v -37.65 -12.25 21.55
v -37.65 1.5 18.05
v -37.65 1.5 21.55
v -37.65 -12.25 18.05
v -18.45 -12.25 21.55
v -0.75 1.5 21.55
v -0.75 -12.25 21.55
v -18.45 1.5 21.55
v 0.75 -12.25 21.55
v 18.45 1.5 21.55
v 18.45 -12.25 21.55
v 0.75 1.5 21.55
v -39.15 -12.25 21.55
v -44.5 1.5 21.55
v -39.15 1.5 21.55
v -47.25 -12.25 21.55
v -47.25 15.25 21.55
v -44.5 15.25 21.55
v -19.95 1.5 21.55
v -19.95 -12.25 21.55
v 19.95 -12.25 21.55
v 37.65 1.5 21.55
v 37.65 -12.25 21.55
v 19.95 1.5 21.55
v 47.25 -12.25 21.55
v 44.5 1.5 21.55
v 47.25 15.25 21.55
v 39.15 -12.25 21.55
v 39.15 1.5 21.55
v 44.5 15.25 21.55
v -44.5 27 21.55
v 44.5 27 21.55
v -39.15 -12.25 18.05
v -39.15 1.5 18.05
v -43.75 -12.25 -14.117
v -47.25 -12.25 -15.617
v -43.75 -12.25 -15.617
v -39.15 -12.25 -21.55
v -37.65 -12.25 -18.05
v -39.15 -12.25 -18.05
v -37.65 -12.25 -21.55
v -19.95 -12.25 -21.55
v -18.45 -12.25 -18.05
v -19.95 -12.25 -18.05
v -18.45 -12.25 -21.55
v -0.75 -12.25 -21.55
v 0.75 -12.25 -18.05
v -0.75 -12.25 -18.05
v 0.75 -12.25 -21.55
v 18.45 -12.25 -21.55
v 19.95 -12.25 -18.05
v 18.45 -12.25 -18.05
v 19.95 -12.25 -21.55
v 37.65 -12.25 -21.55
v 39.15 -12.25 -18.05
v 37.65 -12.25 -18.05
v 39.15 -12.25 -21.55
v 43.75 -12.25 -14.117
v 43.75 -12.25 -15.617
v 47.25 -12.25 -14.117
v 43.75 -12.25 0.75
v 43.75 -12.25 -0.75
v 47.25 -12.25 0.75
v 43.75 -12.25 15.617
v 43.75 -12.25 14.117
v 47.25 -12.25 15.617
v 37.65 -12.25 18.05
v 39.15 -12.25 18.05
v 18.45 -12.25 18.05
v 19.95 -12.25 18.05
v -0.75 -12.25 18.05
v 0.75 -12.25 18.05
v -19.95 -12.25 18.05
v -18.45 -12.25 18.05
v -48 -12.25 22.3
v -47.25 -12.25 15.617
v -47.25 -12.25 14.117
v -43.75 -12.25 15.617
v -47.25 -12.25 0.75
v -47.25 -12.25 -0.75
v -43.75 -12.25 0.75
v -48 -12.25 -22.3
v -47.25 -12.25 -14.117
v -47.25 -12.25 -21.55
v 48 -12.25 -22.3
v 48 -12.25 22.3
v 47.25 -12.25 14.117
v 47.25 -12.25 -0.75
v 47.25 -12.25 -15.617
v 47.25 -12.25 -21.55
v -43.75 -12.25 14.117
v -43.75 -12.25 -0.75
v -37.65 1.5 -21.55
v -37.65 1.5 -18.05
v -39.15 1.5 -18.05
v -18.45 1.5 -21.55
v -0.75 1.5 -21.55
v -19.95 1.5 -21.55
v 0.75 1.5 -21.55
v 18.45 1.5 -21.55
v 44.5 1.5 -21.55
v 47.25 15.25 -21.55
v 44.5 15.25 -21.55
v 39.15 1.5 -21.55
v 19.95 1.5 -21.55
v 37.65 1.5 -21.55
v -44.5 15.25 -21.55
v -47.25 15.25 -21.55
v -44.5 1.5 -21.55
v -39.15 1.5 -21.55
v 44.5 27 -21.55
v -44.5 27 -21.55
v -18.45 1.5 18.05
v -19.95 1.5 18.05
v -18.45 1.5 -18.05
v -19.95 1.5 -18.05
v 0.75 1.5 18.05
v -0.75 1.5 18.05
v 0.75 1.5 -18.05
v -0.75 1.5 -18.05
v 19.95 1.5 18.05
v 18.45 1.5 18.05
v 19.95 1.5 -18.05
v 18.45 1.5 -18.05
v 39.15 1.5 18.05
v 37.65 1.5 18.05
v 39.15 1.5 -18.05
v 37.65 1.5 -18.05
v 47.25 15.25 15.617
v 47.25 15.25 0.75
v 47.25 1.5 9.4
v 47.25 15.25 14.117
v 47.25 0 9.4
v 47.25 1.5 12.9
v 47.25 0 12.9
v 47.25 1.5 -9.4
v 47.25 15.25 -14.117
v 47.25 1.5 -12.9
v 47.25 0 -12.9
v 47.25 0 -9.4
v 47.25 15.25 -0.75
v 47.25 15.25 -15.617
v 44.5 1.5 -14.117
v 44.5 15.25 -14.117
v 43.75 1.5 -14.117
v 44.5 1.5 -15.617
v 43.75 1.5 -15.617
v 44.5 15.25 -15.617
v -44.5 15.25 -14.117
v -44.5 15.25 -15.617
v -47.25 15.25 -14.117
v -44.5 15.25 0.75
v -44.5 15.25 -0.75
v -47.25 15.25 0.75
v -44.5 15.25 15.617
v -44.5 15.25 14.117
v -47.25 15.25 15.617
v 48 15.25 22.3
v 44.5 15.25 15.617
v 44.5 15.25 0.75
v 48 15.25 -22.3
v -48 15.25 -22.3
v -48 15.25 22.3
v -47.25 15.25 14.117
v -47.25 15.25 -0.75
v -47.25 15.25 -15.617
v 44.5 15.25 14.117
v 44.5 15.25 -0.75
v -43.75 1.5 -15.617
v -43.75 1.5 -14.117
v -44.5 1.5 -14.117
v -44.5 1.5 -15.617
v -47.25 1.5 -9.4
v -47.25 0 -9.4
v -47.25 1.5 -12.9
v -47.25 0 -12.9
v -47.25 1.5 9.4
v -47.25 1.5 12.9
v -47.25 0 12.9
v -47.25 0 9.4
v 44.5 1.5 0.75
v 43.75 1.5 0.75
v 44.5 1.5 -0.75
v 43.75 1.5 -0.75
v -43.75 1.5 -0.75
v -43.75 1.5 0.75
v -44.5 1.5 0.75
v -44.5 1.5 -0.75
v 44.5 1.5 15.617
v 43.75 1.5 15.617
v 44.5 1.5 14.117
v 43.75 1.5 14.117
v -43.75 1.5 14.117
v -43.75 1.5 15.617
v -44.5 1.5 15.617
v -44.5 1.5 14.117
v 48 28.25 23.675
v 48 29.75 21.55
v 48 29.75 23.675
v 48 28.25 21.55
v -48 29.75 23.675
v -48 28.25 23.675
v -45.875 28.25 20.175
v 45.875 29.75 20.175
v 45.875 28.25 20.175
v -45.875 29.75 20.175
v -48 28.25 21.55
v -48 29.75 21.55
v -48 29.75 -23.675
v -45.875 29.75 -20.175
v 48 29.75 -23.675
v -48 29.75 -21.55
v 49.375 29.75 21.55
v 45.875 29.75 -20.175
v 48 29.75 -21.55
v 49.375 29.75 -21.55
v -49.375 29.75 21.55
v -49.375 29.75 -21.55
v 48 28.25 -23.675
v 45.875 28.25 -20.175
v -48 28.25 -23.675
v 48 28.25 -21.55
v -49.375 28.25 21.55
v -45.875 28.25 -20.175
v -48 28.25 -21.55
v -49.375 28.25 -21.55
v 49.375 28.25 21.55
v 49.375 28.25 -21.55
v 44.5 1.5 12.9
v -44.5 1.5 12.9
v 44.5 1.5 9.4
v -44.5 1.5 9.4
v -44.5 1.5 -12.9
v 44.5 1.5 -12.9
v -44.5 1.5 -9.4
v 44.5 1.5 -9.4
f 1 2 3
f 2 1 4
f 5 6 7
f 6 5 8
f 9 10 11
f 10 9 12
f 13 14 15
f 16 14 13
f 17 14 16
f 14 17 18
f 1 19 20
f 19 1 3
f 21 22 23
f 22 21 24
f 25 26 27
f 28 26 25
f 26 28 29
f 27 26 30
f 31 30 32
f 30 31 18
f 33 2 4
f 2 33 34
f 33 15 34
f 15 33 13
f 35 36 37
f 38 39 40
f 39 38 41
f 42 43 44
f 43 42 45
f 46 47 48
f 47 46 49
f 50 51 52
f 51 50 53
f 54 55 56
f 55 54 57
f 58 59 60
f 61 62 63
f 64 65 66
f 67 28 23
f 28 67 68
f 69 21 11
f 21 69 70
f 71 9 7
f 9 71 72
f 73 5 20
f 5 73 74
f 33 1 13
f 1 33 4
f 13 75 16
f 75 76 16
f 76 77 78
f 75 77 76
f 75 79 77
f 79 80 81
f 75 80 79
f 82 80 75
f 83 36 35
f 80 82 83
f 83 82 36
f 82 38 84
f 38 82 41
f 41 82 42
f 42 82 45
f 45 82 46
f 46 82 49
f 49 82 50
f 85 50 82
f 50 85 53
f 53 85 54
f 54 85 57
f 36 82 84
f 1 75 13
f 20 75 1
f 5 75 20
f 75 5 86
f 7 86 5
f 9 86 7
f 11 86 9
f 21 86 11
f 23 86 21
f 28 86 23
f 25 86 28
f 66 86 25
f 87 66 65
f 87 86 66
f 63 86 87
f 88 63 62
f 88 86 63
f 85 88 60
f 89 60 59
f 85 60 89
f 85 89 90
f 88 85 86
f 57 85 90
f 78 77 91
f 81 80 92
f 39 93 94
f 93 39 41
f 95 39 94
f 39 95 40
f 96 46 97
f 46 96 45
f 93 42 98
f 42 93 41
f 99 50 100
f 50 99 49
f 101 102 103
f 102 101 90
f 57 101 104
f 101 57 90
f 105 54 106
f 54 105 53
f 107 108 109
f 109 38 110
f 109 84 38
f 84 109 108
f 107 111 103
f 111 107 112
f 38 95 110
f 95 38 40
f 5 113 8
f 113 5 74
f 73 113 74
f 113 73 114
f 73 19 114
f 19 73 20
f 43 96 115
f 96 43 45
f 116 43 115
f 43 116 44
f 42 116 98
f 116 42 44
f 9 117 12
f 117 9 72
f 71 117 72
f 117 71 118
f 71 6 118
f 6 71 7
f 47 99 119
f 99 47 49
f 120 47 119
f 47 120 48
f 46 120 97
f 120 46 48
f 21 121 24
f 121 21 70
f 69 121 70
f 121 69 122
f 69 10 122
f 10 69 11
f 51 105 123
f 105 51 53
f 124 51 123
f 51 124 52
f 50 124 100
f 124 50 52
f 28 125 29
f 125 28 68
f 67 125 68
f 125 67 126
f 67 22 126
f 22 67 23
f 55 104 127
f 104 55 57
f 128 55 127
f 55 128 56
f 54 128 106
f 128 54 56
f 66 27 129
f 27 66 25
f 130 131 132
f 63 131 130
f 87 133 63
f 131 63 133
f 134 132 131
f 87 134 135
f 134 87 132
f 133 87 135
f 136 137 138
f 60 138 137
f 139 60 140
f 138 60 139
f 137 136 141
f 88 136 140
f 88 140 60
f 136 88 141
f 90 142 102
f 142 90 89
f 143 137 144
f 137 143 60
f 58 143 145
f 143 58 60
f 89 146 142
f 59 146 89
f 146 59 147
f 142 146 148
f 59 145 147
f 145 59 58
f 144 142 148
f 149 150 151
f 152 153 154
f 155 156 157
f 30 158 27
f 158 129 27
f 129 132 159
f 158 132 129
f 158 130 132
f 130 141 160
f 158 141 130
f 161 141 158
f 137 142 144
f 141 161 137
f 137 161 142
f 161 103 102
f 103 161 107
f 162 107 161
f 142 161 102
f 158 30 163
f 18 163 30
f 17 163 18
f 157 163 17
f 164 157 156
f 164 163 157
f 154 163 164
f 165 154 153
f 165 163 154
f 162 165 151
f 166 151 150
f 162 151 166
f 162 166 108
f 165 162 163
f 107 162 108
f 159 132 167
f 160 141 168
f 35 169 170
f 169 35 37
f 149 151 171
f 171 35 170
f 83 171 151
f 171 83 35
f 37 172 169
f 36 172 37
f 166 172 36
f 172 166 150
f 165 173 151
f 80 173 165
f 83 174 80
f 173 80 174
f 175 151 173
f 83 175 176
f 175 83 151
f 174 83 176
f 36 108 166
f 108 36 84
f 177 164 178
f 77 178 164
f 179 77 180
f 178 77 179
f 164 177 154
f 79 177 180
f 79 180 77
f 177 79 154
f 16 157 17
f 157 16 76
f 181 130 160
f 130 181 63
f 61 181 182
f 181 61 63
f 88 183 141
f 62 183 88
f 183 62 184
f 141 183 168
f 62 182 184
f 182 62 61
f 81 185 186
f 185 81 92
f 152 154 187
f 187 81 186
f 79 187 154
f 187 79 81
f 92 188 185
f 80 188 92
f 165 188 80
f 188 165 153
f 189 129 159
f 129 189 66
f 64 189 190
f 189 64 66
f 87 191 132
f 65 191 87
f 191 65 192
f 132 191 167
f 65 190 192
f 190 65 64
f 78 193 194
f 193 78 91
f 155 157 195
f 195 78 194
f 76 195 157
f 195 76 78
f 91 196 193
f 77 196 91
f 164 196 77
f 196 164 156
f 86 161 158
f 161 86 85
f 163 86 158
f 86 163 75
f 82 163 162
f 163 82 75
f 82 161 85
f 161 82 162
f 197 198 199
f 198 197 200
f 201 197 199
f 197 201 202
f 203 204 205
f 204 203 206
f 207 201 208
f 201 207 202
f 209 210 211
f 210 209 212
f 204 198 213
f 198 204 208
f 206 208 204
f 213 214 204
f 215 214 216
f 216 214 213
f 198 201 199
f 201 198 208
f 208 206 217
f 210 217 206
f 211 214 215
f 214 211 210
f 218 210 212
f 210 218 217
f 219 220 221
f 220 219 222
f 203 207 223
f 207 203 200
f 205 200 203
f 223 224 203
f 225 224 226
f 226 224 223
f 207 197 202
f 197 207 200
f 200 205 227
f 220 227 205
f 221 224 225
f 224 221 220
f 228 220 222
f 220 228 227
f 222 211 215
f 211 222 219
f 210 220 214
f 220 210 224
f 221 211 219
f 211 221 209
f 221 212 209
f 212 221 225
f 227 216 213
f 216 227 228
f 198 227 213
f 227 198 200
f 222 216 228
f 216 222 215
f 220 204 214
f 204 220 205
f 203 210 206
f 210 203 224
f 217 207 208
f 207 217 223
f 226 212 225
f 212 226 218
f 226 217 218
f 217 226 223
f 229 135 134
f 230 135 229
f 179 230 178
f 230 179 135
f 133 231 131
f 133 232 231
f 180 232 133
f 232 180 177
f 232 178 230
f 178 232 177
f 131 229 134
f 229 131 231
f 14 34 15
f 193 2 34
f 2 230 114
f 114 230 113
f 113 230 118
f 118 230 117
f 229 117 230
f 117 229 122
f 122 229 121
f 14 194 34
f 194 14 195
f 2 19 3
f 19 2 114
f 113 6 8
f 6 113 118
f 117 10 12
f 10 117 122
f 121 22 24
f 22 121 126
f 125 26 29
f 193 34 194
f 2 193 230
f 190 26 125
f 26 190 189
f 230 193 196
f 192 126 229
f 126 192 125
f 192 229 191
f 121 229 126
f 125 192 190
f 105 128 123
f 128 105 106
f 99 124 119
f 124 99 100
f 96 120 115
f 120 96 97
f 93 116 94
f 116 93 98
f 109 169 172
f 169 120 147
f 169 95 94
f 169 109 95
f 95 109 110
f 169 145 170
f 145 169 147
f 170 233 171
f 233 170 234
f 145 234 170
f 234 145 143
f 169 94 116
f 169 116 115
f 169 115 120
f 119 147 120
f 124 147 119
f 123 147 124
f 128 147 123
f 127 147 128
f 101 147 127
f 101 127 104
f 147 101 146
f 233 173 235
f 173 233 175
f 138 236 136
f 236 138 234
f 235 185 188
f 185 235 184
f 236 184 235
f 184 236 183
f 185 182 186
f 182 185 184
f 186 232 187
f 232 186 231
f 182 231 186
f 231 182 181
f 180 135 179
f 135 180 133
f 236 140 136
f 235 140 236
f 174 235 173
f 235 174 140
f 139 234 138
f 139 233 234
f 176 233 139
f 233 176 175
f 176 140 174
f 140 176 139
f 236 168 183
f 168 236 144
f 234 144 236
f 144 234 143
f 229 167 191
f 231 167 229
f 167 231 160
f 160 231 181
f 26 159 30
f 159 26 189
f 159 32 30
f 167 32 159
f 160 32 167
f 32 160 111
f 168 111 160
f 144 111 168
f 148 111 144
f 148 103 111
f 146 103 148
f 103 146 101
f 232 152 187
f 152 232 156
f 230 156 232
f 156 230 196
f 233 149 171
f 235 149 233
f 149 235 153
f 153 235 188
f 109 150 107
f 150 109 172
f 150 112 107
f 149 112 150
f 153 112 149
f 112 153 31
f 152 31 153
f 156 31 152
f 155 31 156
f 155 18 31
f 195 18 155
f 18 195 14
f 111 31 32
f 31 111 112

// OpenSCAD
// file: ../wattplot_params.scad
// =============================================================================
// wattplot_params.scad -- mirror of wattplot_params.py
// =============================================================================
//
// DO NOT EDIT THESE NUMBERS WITHOUT UPDATING wattplot_params.py AND
// firmware/tests/test_openscad_params.py.
//
// The Python source of truth is wattplot_params.py at the repo root.
// This file is a hand-maintained mirror so the OpenSCAD models can
// render without Python. A CI test (test_openscad_params.py) reads
// both and fails if any number has drifted.
//
// If you change a value here, change it in wattplot_params.py first
// and update the test expectations in test_openscad_params.py. The
// commit message should reference the param name (e.g.
// "scad: bump POSTS.height_in to 78 for v3.1 storm margin").
//
// All dimensions are in inches. OpenSCAD's $fn controls mesh
// resolution -- 64 gives a clean STL that's about 2 MB at this
// model's complexity.

// ---------- LOCATION ----------
location_latitude  = 33.45;     // Phoenix, AZ
location_longitude = -112.07;
location_elevation_m = 337;
location_design_wind_mph = 115.0; // ASCE 7-22, Risk Cat II 700-yr

// ---------- PLANTER LIMITS ----------
max_planter_L_in = 96.0;          // 8 ft stock, no waste on long rails
max_planter_W_in = 60.0;          // 5 ft (8 ft cross-cut, 2 cross-rails per board)

// ---------- BED (planter, ballasted) ----------
bed_outer_L_in       = 96.0;       // 8 ft (capped at max_planter_L_in)
bed_outer_W_in       = 44.6;       // matches panel width
bed_wall_thk_in      = 0.75;       // 1x6 cedar (3/4" actual)
bed_wall_h_in        = 27.5;       // 5 courses of 1x6 (5.5" actual)
                                   //   wind-sized: SF_overturning 2.55 at 35°
bed_soil_fill_in     = 25.5;       // 2" freeboard below the rim
                                   //   ~60 cu ft = 2.2 cu yd = ~4,000 lb
bed_skid_h_in        = 1.5;        // walls rest on 2x4 footers
bed_skid_side_in     = 3.5;        // 4x nominal

// ---------- BED WALL (1x6 cedar skin over 2x4 cleats) ----------
wall_skin_thk_in   = 0.75;
wall_course_h_in   = 5.5;
wall_courses       = 5;            // 5 x 5.5" = 27.5" wall
wall_cleat_thk_in  = 1.5;          // 2x4 actual
wall_cleat_wid_in  = 3.5;          // 2x4 actual
wall_cleats_long   = 5;            // per long wall
wall_cleats_short  = 3;            // per short wall
wall_header_thk_in = 1.5;         // 2x4 on wide face
wall_header_wid_in = 3.5;

// ---------- POSTS (4x4 PT, 72" tall, walk-under canopy) ----------
post_thk_in  = 3.5;               // 4x4 actual
post_height_in = 72.0;            // 6 ft -- walk-under / reach-under
post_count   = 4;
post_rail_thk_in = 1.5;          // 2x6 on post tops
post_rail_wid_in = 5.5;

// ---------- PANEL (LONGi Hi-MO X10 620W default) ----------
panel_L_in        = 97.0;         // 8.08 ft (overhangs bed 0.5"/side)
panel_W_in        = 44.6;         // 3.72 ft
panel_thk_in      = 1.4;
panel_mass_lb     = 65.0;
panel_wattage     = 620;
panel_tilt_deg    = 35.0;         // 0 = flat, 35 = max (wind-limited)

// ---------- CONTROL (tilt cap + PI setpoint) ----------
control_max_tilt_deg  = 35.0;     // STRUCTURAL cap. See ADR-001.
control_target_current_A = 0.5;
control_hard_current_limit_A = 2.5;

// ---------- FRAME (perimeter around the panel) ----------
frame_long_rail_thk_in   = 1.5;    // 2x6 actual
frame_long_rail_wid_in   = 5.5;
frame_long_rail_length_in = 96.0;  // 8 ft stock, no waste

frame_cross_rail_thk_in   = 1.5;   // 2x6 actual
frame_cross_rail_wid_in   = 5.5;
frame_cross_rail_length_in = 42.0; // 2x6x8ft cut to 42"

frame_brace_thk_in   = 1.5;         // 2x4 actual
frame_brace_wid_in   = 3.5;
frame_brace_length_in = 102.0;     // 2x4x10ft cut to 102"

// ---------- HINGES + PANEL CLAMPS ----------
hinge_leaf_in    = 4.0;            // 4"x4" leaf, 1/2" pin
hinge_pin_d_in    = 0.5;
hinge_count      = 4;
hinge_spacing_in = 22.0;           // 22" o.c.
hinge_rod_length_in = 72.0;        // 1/2" x 72" steel rod (HD)

panel_clamp_length_in = 2.0;       // IronRidge mid-clamp, 35mm channel
panel_clamp_height_in = 2.0;
panel_clamp_thk_in   = 0.4;
panel_clamps_per_long_rail  = 2;
panel_clamps_per_cross_rail = 1;

// ---------- ACTUATOR MOUNT ----------
actuator_block_thk_in  = 1.5;      // 2x6 actual
actuator_block_wid_in  = 5.5;
actuator_block_length_in = 6.0;
actuator_stroke_in     = 4.0;       // 12V linear actuator
actuator_width_in      = 2.0;       // body width (for clearance check)
actuator_height_in     = 2.5;

// ---------- DERIVED (don't change) ----------
// Bed is sized so the panel overhangs the rails by 0.5" per side.
// The panel mid-clamps grip the aluminum frame, not the glass.
bed_inner_L_in = bed_outer_L_in - 2 * post_thk_in;
bed_inner_W_in = bed_outer_W_in - 2 * wall_skin_thk_in;
// Wall sits on top of skid; rim = wall + skid.
bed_rim_h_in = bed_wall_h_in + bed_skid_h_in;
// Panel frame offset above the bed rail (clearance for the clamp).
panel_clearance_in = 2.0;         // 2" above the rail top

// Render resolution: $fn controls segment count for curves.
// 64 gives a clean STL ~2 MB. Lower for fast preview, higher for
// 3D printing.
$fn = 64;
// main file
// =============================================================================
// parts/bed.scad -- the planter bed (walls + cleats + header + skids + soil)
// =============================================================================
//
// Self-contained part module. Include wattplot_params.scad for the
// dimensions; render with `use <bed.scad>` to compose into an
// assembly. Color and visibility gates are passed in by the parent
// (wattplot.scad).
//
// Coordinate system (matches the canonical model):
//   X = bed length (south -> north)
//   Y = up
//   Z = bed width (east -> west)

include <../wattplot_params.scad>

module bed_assembly(show_soil=true) {
    // The 4 walls: long (N/S) on the X axis, short (E/W) on Z.
    // Y = wall_h_in. Walls are thin (skin_thk) boards.
    // South wall = the hinge side.
    // North wall = the strut / actuator-mount side.
    
    // Long walls (X axis, run the full bed length)
    color(col_bed_skin_default)
    translate([0, bed_skid_h_in,  bed_outer_W_in/2 - wall_skin_thk_in/2])
        cube([bed_outer_L_in, bed_wall_h_in, wall_skin_thk_in], center=true);
    color(col_bed_skin_default)
    translate([0, bed_skid_h_in, -bed_outer_W_in/2 + wall_skin_thk_in/2])
        cube([bed_outer_L_in, bed_wall_h_in, wall_skin_thk_in], center=true);
    
    // Short walls (Z axis, between the long walls)
    color(col_bed_skin_default)
    translate([ bed_outer_L_in/2 - wall_skin_thk_in/2, bed_skid_h_in, 0])
        cube([wall_skin_thk_in, bed_wall_h_in, bed_inner_W_in], center=true);
    color(col_bed_skin_default)
    translate([-bed_outer_L_in/2 + wall_skin_thk_in/2, bed_skid_h_in, 0])
        cube([wall_skin_thk_in, bed_wall_h_in, bed_inner_W_in], center=true);
    
    // Cleats: vertical 2x4s, evenly spaced (>=24" o.c. per design
    // rule #3). 5 per long wall, 3 per short wall.
    color(col_bed_cleat_default)
    for (i = [0:wall_cleats_long-1]) {
        x = -bed_outer_L_in/2 + bed_outer_L_in * (i + 0.5) / wall_cleats_long;
        translate([x, bed_skid_h_in,  bed_outer_W_in/2 - wall_skin_thk_in - wall_cleat_wid_in/2])
            cube([wall_cleat_thk_in, bed_wall_h_in, wall_cleat_wid_in], center=true);
        translate([x, bed_skid_h_in, -bed_outer_W_in/2 + wall_skin_thk_in + wall_cleat_wid_in/2])
            cube([wall_cleat_thk_in, bed_wall_h_in, wall_cleat_wid_in], center=true);
    }
    color(col_bed_cleat_default)
    for (i = [0:wall_cleats_short-1]) {
        z = -bed_outer_W_in/2 + bed_outer_W_in * (i + 0.5) / wall_cleats_short;
        translate([ bed_outer_L_in/2 - wall_skin_thk_in - wall_cleat_wid_in/2, bed_skid_h_in, z])
            cube([wall_cleat_wid_in, bed_wall_h_in, wall_cleat_thk_in], center=true);
        translate([-bed_outer_L_in/2 + wall_skin_thk_in + wall_cleat_wid_in/2, bed_skid_h_in, z])
            cube([wall_cleat_wid_in, bed_wall_h_in, wall_cleat_thk_in], center=true);
    }
    
    // Header: 2x4 cedar on its wide face, on top of every planter wall
    color(col_bed_skin_default)
    translate([0, bed_rim_h_in,  bed_outer_W_in/2 - wall_skin_thk_in/2])
        cube([bed_outer_L_in, wall_header_thk_in, wall_header_wid_in], center=true);
    color(col_bed_skin_default)
    translate([0, bed_rim_h_in, -bed_outer_W_in/2 + wall_skin_thk_in/2])
        cube([bed_outer_L_in, wall_header_thk_in, wall_header_wid_in], center=true);
    color(col_bed_skin_default)
    translate([ bed_outer_L_in/2 - wall_skin_thk_in/2, bed_rim_h_in, 0])
        cube([wall_header_wid_in, wall_header_thk_in, bed_inner_W_in], center=true);
    color(col_bed_skin_default)
    translate([-bed_outer_L_in/2 + wall_skin_thk_in/2, bed_rim_h_in, 0])
        cube([wall_header_wid_in, wall_header_thk_in, bed_inner_W_in], center=true);
    
    // Skids: 2x4 PT DF laid on wide side, 8 ft long, under the bed
    color(col_skid_default)
    translate([0, bed_skid_h_in/2,  bed_outer_W_in/4])
        cube([bed_outer_L_in, bed_skid_h_in, bed_skid_side_in], center=true);
    color(col_skid_default)
    translate([0, bed_skid_h_in/2, -bed_outer_W_in/4])
        cube([bed_outer_L_in, bed_skid_h_in, bed_skid_side_in], center=true);
    
    // Soil fill (visual placeholder -- not structural)
    if (show_soil)
    color(col_soil_default)
    translate([0, bed_skid_h_in + bed_soil_fill_in/2, 0])
        cube([bed_inner_L_in, bed_soil_fill_in, bed_inner_W_in], center=true);
}

// Default colors for standalone use. The canonical wattplot.scad
// overrides these with its own palette.
col_bed_skin_default = [0.78, 0.55, 0.35];   // cedar
col_bed_cleat_default = [0.85, 0.65, 0.45];
col_skid_default       = [0.55, 0.40, 0.30];   // PT DF
col_soil_default       = [0.40, 0.25, 0.15];   // wet loam

// Render the bed alone when this file is opened directly. The
// if/else avoids a recursive render when used via `use <bed.scad>`.
if (is_undef($use_only)) {
    $fn = 64;
    bed_assembly();
}
